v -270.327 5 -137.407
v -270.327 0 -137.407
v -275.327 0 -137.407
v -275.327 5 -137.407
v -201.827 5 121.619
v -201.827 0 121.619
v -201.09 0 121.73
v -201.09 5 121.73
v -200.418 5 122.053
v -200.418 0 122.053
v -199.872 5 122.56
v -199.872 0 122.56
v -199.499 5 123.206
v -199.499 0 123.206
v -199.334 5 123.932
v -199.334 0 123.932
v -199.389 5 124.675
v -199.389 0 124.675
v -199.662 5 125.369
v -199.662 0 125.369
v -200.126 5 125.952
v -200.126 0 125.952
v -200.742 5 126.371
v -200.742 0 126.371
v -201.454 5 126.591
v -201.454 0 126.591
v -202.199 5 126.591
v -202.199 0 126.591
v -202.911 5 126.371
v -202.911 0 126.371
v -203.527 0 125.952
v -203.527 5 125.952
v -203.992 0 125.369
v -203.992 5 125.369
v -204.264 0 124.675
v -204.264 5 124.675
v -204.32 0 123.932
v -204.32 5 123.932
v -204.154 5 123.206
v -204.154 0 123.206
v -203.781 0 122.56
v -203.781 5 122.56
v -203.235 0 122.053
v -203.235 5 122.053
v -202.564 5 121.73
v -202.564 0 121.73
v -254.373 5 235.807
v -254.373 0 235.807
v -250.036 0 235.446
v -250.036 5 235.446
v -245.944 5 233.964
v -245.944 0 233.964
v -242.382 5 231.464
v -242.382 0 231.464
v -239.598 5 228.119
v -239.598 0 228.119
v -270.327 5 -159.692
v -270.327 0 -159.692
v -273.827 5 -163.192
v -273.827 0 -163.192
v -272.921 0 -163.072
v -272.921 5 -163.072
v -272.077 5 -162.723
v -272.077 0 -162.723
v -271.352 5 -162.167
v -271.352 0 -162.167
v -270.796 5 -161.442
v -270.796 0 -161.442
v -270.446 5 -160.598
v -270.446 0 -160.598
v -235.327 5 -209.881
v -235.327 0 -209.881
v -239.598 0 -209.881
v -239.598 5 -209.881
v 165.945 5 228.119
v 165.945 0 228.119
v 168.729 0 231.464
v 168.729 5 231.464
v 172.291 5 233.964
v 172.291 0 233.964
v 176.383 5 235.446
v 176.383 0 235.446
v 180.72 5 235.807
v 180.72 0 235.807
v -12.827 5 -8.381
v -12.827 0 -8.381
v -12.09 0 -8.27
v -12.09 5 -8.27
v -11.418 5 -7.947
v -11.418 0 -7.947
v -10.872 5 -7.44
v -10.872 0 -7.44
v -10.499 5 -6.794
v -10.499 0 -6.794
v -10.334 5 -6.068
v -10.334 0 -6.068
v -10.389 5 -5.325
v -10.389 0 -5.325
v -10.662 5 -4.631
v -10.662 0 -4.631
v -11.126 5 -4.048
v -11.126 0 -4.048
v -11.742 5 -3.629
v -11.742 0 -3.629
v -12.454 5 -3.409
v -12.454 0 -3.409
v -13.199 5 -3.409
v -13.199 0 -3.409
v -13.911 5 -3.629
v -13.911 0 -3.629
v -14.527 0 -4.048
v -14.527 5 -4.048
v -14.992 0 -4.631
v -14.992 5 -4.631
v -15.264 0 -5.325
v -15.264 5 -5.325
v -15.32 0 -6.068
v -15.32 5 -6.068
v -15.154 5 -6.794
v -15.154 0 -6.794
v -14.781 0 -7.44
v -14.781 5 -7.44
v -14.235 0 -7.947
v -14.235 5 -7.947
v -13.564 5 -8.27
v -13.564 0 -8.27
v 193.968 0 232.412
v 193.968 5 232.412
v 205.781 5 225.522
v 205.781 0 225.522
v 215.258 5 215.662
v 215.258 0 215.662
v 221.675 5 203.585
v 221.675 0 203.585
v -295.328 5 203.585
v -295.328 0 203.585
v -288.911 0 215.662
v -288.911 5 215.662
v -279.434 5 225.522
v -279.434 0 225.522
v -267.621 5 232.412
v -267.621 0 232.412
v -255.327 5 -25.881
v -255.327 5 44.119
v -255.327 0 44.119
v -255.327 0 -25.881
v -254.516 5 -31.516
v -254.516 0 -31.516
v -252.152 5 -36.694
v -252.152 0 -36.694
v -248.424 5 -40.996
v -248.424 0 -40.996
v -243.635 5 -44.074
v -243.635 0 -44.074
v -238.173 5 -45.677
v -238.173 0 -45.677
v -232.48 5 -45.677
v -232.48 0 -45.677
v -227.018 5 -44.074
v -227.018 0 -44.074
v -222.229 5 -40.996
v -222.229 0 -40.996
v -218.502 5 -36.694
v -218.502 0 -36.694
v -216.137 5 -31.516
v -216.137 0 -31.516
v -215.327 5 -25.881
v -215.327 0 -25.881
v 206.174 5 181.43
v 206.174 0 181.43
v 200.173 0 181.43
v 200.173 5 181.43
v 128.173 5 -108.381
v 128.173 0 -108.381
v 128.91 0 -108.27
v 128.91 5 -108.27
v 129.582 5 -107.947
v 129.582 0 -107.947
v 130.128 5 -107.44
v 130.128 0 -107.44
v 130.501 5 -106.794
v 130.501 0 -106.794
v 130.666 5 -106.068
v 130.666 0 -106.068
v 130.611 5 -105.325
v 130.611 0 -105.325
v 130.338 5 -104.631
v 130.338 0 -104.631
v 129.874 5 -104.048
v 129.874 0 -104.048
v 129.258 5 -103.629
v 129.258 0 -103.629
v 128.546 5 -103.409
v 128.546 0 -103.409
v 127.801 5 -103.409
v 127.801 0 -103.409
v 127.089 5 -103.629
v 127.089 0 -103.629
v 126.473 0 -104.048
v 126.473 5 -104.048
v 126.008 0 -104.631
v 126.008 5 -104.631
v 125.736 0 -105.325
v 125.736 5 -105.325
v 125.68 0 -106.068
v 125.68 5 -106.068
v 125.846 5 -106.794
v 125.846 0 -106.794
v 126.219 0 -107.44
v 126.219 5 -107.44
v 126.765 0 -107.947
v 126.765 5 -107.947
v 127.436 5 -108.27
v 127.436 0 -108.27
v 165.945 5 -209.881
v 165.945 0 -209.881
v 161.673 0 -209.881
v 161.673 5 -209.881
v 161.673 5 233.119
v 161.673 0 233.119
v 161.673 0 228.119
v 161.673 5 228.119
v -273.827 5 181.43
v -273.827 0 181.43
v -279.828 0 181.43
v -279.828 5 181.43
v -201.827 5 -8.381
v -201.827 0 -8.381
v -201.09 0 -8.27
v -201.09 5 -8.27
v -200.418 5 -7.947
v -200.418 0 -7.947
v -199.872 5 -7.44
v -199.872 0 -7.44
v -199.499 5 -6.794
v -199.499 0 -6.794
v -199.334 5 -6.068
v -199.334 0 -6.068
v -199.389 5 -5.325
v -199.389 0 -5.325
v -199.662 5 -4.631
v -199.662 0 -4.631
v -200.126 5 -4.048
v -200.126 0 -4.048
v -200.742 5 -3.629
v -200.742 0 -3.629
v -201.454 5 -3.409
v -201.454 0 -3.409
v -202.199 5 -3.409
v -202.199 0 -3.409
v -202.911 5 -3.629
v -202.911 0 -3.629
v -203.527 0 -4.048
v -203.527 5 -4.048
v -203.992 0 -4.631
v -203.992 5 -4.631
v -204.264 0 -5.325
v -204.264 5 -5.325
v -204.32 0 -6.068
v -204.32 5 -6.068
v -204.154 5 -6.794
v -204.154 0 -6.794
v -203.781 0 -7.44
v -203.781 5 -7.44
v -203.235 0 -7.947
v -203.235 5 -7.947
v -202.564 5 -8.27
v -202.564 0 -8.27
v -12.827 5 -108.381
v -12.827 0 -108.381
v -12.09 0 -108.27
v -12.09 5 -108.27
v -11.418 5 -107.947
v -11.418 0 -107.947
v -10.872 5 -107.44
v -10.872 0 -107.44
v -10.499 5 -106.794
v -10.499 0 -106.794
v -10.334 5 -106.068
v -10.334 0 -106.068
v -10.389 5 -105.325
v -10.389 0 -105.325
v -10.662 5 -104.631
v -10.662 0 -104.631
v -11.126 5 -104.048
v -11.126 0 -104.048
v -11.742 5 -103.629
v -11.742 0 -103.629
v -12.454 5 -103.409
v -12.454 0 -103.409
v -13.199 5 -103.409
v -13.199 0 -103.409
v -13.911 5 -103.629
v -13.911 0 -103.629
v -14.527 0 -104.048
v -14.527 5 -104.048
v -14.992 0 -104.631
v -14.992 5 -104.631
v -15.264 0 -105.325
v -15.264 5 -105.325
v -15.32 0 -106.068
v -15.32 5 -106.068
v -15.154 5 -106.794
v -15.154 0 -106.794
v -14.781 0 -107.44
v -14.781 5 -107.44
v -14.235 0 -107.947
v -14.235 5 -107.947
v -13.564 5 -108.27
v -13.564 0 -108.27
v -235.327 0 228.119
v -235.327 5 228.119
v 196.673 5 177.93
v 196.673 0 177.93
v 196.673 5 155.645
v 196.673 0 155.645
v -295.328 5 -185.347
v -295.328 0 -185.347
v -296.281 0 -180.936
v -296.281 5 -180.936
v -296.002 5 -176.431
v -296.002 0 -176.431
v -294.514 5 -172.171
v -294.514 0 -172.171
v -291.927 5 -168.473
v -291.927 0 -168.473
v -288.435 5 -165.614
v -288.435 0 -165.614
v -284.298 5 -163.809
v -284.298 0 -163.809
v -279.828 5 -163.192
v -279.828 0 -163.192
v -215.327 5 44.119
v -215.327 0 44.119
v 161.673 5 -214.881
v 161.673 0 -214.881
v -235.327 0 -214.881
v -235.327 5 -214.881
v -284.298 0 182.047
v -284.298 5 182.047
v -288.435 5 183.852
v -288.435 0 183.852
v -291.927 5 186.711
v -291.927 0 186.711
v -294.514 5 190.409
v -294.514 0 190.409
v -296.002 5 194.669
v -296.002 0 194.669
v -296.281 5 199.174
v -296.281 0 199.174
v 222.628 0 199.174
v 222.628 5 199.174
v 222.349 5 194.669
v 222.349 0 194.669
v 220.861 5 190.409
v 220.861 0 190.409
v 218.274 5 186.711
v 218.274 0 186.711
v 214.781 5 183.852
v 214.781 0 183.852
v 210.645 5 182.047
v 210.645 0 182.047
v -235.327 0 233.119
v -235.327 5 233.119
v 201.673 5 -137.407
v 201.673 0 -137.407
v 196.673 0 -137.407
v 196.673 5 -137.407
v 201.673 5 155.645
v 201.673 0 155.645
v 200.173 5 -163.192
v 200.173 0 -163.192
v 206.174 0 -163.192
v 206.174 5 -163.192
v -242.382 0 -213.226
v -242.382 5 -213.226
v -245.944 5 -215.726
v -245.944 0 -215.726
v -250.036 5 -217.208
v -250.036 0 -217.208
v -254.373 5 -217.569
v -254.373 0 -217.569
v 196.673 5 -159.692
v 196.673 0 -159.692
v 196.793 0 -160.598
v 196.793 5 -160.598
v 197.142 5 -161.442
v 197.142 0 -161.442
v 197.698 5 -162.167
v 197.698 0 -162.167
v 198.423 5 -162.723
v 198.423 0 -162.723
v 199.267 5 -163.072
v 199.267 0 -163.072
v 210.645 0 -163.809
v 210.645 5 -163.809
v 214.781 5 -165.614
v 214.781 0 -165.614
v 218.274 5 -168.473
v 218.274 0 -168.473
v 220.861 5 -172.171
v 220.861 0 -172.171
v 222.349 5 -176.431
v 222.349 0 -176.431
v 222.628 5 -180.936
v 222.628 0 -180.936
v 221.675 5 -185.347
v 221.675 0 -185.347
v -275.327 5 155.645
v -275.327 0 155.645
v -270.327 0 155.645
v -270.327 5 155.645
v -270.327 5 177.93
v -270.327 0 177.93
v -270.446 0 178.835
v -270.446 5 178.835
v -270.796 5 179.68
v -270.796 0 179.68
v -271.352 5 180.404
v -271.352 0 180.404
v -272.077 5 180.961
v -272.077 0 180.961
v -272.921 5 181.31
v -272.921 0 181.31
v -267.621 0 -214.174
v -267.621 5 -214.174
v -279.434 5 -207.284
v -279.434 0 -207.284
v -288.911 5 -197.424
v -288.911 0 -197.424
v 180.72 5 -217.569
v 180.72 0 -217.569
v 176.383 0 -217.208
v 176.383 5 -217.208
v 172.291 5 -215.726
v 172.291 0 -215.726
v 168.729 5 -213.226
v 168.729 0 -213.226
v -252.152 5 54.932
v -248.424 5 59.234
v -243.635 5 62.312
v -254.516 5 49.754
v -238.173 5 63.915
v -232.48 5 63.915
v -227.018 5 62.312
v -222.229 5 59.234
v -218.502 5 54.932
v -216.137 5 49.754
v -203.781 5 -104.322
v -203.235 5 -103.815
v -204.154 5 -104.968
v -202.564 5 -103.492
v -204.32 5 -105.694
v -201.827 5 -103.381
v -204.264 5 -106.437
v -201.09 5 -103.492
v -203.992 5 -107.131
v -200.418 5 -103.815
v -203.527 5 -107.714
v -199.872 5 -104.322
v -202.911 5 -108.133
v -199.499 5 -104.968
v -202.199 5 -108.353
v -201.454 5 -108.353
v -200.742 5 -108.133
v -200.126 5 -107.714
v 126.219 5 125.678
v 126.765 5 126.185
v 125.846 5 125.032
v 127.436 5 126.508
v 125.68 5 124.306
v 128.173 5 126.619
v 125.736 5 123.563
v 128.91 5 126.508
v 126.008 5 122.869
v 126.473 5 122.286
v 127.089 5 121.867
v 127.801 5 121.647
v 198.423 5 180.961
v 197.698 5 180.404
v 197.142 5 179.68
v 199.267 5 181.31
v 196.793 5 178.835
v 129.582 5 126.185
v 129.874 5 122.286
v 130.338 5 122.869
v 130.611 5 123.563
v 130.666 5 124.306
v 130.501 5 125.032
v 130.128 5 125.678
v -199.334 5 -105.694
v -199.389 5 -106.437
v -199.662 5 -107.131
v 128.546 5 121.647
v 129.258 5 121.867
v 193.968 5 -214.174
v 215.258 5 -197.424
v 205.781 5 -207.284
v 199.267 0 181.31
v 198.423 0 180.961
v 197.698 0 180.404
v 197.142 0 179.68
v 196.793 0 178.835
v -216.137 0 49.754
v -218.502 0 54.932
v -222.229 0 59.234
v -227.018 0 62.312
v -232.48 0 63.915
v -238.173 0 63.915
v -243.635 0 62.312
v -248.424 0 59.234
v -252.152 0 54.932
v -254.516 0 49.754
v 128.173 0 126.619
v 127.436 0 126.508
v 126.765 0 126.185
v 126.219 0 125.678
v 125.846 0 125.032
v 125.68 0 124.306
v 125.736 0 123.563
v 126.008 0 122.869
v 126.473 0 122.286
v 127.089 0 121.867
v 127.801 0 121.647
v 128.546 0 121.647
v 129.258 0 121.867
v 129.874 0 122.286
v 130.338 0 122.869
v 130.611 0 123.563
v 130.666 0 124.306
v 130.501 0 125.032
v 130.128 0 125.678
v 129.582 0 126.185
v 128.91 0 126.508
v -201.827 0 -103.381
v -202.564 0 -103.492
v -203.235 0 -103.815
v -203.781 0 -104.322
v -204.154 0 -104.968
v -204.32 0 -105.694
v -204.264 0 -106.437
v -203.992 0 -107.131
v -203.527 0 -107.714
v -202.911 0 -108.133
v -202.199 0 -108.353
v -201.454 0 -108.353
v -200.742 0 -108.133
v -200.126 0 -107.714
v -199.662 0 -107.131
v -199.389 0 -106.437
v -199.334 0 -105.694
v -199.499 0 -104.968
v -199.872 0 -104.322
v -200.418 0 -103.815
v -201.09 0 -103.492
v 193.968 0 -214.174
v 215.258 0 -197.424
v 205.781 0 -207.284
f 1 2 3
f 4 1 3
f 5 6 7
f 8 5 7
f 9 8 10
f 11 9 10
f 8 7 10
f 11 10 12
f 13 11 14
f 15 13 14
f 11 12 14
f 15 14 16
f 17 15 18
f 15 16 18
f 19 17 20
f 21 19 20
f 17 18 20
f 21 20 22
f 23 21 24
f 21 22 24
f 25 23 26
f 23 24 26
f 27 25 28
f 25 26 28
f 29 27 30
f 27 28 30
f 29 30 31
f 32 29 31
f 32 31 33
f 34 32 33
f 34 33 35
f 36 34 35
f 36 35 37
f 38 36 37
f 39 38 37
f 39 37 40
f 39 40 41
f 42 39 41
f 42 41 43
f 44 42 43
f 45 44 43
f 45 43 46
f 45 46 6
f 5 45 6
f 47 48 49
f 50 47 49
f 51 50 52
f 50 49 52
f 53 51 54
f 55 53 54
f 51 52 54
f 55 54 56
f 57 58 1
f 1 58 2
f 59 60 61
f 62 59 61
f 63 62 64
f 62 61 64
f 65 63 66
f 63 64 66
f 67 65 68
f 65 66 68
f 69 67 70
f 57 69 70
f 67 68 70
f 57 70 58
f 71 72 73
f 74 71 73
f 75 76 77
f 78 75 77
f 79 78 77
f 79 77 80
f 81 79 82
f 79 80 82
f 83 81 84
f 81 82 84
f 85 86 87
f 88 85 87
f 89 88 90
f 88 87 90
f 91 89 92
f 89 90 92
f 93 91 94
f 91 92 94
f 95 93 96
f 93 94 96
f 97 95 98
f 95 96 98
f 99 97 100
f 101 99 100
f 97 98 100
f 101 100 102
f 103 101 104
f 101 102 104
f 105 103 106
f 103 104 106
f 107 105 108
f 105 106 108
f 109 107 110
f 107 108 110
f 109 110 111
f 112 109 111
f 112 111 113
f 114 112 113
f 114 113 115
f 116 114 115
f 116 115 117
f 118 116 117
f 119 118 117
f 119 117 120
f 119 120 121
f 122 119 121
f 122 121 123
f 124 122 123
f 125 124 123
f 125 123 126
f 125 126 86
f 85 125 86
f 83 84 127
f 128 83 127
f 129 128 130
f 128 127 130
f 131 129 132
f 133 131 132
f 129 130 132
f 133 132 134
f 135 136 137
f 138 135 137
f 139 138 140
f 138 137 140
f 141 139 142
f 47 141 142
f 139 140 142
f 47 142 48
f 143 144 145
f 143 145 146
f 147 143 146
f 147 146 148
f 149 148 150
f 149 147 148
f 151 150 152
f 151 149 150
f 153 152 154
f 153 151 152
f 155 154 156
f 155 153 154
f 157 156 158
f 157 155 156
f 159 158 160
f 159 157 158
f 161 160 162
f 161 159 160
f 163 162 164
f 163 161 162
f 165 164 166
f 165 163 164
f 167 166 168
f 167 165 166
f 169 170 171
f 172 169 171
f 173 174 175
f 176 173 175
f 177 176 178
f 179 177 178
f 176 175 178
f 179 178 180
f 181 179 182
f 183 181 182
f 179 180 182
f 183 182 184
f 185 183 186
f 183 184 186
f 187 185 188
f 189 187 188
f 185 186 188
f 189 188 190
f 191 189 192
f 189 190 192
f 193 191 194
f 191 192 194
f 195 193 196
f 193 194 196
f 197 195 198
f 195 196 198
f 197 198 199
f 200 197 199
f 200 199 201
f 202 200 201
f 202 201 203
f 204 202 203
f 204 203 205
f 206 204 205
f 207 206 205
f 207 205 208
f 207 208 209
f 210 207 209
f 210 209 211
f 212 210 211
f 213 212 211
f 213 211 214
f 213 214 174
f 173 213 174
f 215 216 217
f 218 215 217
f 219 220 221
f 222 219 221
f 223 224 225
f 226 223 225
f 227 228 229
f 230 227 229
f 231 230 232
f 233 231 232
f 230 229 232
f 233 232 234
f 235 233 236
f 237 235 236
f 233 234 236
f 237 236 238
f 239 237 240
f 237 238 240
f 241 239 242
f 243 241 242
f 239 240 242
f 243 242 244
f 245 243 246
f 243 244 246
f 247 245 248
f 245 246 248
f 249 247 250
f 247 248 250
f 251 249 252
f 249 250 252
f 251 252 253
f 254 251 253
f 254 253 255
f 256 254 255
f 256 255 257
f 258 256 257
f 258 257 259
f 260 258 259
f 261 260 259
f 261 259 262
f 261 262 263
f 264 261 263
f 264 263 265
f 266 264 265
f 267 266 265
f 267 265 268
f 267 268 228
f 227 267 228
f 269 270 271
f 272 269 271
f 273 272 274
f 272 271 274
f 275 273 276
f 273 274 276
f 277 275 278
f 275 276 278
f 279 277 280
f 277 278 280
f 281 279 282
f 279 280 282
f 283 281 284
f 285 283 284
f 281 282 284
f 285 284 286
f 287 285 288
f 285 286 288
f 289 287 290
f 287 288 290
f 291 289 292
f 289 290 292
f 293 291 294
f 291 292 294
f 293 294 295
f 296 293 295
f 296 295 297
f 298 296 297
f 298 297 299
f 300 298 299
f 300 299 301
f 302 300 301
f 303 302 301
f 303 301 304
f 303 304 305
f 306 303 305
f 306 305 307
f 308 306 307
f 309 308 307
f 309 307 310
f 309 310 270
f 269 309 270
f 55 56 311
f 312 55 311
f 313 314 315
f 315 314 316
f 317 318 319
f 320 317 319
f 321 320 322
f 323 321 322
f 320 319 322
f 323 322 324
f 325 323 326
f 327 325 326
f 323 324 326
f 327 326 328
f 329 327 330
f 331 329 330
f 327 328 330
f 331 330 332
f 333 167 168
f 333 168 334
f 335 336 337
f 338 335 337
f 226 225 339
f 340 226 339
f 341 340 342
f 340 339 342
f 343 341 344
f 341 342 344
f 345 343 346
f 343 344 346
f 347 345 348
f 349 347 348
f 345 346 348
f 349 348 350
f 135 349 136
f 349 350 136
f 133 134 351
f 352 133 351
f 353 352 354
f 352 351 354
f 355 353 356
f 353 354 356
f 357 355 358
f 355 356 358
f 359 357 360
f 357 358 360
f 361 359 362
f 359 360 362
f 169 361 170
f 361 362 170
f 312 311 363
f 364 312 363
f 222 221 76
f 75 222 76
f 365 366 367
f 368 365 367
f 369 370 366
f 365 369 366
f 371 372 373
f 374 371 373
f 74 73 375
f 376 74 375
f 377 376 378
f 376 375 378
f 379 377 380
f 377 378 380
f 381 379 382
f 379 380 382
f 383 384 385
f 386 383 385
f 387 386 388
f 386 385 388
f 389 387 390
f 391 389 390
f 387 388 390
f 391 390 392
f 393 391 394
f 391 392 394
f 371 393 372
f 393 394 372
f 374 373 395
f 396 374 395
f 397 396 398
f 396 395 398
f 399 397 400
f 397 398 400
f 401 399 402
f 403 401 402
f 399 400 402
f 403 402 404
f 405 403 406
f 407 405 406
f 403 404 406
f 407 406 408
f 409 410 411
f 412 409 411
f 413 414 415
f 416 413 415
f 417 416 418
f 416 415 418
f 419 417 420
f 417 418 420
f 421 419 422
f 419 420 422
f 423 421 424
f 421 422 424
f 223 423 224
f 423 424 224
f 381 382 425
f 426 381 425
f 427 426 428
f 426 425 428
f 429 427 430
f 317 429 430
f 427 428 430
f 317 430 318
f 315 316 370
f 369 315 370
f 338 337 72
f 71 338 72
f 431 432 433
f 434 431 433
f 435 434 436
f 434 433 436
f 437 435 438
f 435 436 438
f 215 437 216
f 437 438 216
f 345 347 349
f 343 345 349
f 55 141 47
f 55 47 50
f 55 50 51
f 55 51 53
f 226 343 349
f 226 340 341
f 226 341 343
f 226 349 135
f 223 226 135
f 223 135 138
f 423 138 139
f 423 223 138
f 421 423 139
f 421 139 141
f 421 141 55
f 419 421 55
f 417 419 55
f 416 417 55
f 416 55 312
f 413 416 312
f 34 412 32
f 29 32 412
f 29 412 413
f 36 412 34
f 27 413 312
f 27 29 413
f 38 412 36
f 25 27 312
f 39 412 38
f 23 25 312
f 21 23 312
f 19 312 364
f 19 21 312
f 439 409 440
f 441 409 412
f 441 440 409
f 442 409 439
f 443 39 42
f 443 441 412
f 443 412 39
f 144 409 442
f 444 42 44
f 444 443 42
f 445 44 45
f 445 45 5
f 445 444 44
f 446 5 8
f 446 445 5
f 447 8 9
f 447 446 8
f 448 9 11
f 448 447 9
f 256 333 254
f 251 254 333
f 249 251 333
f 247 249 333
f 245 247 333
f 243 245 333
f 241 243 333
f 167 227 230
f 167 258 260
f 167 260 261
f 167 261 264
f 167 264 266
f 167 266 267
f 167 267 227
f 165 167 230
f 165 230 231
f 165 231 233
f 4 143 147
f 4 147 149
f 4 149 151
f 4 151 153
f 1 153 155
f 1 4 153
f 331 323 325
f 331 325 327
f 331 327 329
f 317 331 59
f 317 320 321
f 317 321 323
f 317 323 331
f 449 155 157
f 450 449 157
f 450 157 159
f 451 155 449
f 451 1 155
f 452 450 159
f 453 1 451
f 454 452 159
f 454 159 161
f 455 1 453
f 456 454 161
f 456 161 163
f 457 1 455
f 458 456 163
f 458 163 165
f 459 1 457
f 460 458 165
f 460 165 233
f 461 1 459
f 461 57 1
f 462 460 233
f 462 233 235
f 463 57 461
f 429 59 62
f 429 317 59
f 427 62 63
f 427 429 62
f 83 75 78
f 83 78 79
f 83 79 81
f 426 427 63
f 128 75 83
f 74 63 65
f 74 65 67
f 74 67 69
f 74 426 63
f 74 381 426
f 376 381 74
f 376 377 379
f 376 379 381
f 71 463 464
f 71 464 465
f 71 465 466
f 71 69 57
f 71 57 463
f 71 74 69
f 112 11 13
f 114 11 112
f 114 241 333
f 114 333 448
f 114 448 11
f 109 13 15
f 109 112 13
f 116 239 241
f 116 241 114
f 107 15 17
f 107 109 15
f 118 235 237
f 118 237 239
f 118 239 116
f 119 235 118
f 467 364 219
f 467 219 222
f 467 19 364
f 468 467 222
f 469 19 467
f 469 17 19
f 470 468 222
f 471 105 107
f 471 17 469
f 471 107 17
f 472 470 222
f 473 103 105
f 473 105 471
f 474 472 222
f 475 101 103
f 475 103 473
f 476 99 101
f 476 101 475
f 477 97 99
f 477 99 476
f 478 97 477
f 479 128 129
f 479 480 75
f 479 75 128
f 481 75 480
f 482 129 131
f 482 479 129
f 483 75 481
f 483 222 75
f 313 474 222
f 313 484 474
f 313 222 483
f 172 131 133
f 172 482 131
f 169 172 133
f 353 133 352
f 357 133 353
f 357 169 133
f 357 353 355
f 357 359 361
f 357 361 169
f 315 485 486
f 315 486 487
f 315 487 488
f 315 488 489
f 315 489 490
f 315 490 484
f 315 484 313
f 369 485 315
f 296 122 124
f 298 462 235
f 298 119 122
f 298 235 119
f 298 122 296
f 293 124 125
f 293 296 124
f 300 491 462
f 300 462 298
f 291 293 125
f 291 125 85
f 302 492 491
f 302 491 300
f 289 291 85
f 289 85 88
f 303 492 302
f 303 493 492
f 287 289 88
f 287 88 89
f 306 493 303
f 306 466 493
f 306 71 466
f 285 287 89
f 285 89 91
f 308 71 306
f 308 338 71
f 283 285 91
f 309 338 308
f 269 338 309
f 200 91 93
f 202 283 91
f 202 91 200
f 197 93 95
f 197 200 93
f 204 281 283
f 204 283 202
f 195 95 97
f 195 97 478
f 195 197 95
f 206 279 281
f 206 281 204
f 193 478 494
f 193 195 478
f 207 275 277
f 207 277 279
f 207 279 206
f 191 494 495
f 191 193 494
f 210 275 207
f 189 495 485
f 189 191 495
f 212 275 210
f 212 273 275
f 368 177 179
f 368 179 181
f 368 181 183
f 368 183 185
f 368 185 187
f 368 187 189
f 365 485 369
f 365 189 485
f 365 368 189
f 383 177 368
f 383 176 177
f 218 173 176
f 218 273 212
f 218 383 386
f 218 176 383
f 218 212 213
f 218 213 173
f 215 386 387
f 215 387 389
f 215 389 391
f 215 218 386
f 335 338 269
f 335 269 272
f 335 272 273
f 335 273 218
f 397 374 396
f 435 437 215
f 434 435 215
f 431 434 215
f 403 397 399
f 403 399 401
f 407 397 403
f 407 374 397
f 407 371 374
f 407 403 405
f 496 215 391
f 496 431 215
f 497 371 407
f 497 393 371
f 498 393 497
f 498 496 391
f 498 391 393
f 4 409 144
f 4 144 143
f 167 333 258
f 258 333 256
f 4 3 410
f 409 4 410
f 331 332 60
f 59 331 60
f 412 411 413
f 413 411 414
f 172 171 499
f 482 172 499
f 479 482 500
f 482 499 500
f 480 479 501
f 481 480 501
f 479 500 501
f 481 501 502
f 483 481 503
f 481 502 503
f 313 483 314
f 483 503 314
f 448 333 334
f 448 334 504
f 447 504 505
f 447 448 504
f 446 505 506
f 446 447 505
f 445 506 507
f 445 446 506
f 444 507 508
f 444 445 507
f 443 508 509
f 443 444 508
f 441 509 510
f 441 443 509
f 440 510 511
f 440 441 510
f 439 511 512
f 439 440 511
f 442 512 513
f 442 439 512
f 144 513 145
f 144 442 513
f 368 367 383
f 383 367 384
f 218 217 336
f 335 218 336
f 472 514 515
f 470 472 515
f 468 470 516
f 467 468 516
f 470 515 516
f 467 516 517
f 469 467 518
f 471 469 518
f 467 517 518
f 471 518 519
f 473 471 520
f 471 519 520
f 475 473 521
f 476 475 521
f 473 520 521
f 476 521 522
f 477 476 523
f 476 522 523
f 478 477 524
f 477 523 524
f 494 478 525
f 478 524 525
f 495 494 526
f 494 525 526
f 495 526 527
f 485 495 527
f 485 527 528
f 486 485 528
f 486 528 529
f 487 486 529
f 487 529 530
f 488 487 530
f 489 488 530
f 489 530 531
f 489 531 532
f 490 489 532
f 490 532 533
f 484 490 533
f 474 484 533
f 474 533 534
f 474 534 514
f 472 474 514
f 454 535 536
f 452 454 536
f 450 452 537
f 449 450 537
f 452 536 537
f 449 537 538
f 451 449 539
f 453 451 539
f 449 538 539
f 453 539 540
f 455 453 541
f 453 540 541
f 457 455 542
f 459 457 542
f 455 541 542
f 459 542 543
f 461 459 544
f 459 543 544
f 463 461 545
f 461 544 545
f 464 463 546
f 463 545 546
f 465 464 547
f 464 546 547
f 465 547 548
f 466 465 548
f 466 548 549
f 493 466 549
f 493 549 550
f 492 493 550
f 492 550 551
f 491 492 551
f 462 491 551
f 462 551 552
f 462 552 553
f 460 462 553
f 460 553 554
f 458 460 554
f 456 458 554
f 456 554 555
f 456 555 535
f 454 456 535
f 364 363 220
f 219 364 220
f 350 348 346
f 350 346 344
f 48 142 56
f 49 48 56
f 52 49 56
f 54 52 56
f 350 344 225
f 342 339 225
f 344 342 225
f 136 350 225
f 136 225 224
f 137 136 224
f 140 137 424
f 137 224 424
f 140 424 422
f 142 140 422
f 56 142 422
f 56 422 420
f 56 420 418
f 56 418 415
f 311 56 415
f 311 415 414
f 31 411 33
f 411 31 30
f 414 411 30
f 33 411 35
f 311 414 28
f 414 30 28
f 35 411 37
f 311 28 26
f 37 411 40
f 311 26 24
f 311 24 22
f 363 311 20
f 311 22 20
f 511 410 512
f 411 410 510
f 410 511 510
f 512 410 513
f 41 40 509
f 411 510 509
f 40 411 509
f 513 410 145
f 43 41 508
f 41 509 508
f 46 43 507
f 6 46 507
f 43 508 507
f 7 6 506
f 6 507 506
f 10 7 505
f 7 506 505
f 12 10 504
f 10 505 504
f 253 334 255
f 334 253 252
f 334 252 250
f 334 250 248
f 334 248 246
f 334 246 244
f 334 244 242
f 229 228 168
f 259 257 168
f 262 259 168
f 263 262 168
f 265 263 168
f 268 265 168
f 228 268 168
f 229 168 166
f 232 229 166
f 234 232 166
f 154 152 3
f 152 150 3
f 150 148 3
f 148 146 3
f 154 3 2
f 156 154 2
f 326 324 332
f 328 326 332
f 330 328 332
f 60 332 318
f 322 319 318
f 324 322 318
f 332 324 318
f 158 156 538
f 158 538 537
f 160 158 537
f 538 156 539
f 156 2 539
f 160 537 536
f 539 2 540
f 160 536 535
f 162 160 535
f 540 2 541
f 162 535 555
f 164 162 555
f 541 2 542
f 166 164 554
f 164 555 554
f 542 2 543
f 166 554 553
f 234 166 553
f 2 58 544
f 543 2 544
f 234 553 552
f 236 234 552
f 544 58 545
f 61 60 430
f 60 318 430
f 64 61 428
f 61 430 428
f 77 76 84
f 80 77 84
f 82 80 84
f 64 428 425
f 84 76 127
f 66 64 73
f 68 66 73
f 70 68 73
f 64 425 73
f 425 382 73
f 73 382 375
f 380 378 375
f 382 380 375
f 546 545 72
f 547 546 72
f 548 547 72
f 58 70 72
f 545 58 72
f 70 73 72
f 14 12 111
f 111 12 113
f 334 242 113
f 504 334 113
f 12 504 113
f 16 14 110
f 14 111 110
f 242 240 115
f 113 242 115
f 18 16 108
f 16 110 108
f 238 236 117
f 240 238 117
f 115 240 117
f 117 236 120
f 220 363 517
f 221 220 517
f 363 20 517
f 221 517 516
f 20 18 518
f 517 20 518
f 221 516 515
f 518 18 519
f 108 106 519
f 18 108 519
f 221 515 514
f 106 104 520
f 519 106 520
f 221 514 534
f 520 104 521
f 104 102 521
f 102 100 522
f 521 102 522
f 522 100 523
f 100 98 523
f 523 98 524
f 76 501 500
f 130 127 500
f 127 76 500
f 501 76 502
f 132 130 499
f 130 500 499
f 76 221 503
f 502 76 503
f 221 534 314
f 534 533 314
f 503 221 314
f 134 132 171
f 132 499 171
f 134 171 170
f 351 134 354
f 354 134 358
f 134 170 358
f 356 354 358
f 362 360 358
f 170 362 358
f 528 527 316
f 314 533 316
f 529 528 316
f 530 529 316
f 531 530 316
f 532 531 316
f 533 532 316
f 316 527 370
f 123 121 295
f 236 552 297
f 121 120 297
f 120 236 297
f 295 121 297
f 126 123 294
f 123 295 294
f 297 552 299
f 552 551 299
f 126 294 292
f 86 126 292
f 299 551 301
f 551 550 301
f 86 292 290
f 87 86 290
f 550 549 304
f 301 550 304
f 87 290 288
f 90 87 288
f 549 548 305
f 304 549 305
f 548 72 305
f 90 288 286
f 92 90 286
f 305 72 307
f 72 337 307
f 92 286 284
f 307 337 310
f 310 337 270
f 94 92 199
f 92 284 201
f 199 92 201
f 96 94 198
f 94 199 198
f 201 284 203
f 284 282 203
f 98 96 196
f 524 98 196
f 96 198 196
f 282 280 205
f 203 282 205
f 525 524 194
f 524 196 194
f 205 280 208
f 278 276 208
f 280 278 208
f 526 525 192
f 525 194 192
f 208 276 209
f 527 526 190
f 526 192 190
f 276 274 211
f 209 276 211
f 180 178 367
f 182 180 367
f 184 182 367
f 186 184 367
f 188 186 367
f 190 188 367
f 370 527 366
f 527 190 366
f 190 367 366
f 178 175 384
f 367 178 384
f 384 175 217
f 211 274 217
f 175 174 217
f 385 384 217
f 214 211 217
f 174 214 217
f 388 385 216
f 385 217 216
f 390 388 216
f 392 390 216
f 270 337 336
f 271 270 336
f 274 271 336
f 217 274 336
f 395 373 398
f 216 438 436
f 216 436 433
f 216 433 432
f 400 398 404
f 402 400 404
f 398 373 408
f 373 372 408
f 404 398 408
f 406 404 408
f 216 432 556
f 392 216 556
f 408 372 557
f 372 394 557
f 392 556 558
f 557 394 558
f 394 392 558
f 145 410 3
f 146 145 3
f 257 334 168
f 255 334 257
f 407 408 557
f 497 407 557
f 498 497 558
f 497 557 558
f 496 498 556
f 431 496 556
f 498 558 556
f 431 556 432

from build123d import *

# Parameters (mm, degrees)
BOSS_EXTRUDE1_DEPTH = 5
SKETCH4_R           = 2.5
CUT_EXTRUDE1_DEPTH  = 20
CUT_EXTRUDE2_DEPTH  = 10
SKETCH8_R           = 2.5
CUT_EXTRUDE3_DEPTH  = 10


with BuildPart() as part:
    # Sketch1 → Boss-Extrude1 (new body)
    with BuildSketch(Plane(origin=(0, 0, 0), x_dir=(1, 0, 0), z_dir=(0, 1, 0))):
        with BuildLine():
            Line((-279.827757823, 163.191662052), (-273.826637764, 163.191662052))
            ThreePointArc((-273.826637764, 163.191662052), (-271.35176403, 162.166535786), (-270.326637764, 159.691662052))
            Line((-270.326637764, 159.691662052), (-270.326637764, 137.406790352))
            Line((-270.326637764, 137.406790352), (-275.326637764, 137.406790352))
            Line((-275.326637764, 137.406790352), (-275.326637764, -155.644744292))
            Line((-275.326637764, -155.644744292), (-270.326637764, -155.644744292))
            Line((-270.326637764, -155.644744292), (-270.326637764, -177.929615992))
            ThreePointArc((-270.326637764, -177.929615992), (-271.35176403, -180.404489727), (-273.826637764, -181.429615992))
            Line((-273.826637764, -181.429615992), (-279.827757823, -181.429615992))
            ThreePointArc((-279.827757823, -181.429615992), (-293.34742446, -188.470830973), (-295.328317853, -203.584935503))
            ThreePointArc((-295.328317853, -203.584935503), (-279.434102169, -225.521844766), (-254.372898367, -235.807278357))
            ThreePointArc((-254.372898367, -235.807278357), (-245.944078079, -233.964230965), (-239.597831877, -228.11897697))
            Line((-239.597831877, -228.11897697), (-235.326637764, -228.11897697))
            Line((-235.326637764, -228.11897697), (-235.326637764, -233.11897697))
            Line((-235.326637764, -233.11897697), (161.673362236, -233.11897697))
            Line((161.673362236, -233.11897697), (161.673362236, -228.11897697))
            Line((161.673362236, -228.11897697), (165.944556349, -228.11897697))
            ThreePointArc((165.944556349, -228.11897697), (172.290802551, -233.964230965), (180.719622838, -235.807278357))
            ThreePointArc((180.719622838, -235.807278357), (205.780826641, -225.521844766), (221.675042324, -203.584935503))
            ThreePointArc((221.675042324, -203.584935503), (219.694148932, -188.470830973), (206.174482295, -181.429615992))
            Line((206.174482295, -181.429615992), (200.173362236, -181.429615992))
            ThreePointArc((200.173362236, -181.429615992), (197.698488502, -180.404489727), (196.673362236, -177.929615992))
            Line((196.673362236, -177.929615992), (196.673362236, -155.644744292))
            Line((196.673362236, -155.644744292), (201.673362236, -155.644744292))
            Line((201.673362236, -155.644744292), (201.673362236, 137.406790352))
            Line((201.673362236, 137.406790352), (196.673362236, 137.406790352))
            Line((196.673362236, 137.406790352), (196.673362236, 159.691662052))
            ThreePointArc((196.673362236, 159.691662052), (197.698488502, 162.166535786), (200.173362236, 163.191662052))
            Line((200.173362236, 163.191662052), (206.174482295, 163.191662052))
            ThreePointArc((206.174482295, 163.191662052), (219.694148932, 170.232877033), (221.675042324, 185.346981563))
            ThreePointArc((221.675042324, 185.346981563), (205.780826641, 207.283890825), (180.719622838, 217.569324417))
            ThreePointArc((180.719622838, 217.569324417), (172.290802551, 215.726277025), (165.944556349, 209.88102303))
            Line((165.944556349, 209.88102303), (161.673362236, 209.88102303))
            Line((161.673362236, 209.88102303), (161.673362236, 214.88102303))
            Line((161.673362236, 214.88102303), (-235.326637764, 214.88102303))
            Line((-235.326637764, 214.88102303), (-235.326637764, 209.88102303))
            Line((-235.326637764, 209.88102303), (-239.597831877, 209.88102303))
            ThreePointArc((-239.597831877, 209.88102303), (-245.944078079, 215.726277025), (-254.372898367, 217.569324417))
            ThreePointArc((-254.372898367, 217.569324417), (-279.434102169, 207.283890825), (-295.328317853, 185.346981563))
            ThreePointArc((-295.328317853, 185.346981563), (-293.34742446, 170.232877033), (-279.827757823, 163.191662052))
        make_face()
    extrude(amount=BOSS_EXTRUDE1_DEPTH)

    # Sketch4 → Cut-Extrude1 (cut)
    with BuildSketch(Plane.XZ):
        with Locations(Location((-201.826637764, 124.11897697, 0), (0, 0, 270))):
            Circle(SKETCH4_R)
        with Locations(Location((-201.826637764, -105.88102303, 0), (0, 0, 90))):
            Circle(SKETCH4_R)
        with Locations(Location((128.173362236, -105.88102303, 0), (0, 0, 270))):
            Circle(SKETCH4_R)
        with Locations(Location((128.173362236, 124.11897697, 0), (0, 0, 90))):
            Circle(SKETCH4_R)
    extrude(amount=-CUT_EXTRUDE1_DEPTH, mode=Mode.SUBTRACT)

    # Sketch5 → Cut-Extrude2 (cut)
    with BuildSketch(Plane(origin=(0, 5, 0), x_dir=(1, 0, 0), z_dir=(0, 1, 0))):
        with BuildLine():
            Line((-255.326637764, -44.11897697), (-255.326637764, 25.88102303))
            ThreePointArc((-255.326637764, 25.88102303), (-235.326637764, 45.88102303), (-215.326637764, 25.88102303))
            Line((-215.326637764, 25.88102303), (-215.326637764, -44.11897697))
            ThreePointArc((-215.326637764, -44.11897697), (-235.326637764, -64.11897697), (-255.326637764, -44.11897697))
        make_face()
    extrude(amount=-CUT_EXTRUDE2_DEPTH, mode=Mode.SUBTRACT)

    # Sketch8 → Cut-Extrude3 (cut)
    with BuildSketch(Plane.XZ):
        with Locations(Location((-201.826637764, -105.88102303, 0), (0, 0, 90))):
            Circle(SKETCH8_R)
        with Locations(Location((-201.826637764, -5.88102303, 0), (0, 0, 270))):
            Circle(SKETCH8_R)
        with Locations(Location((-12.826637764, -5.88102303, 0), (0, 0, 270))):
            Circle(SKETCH8_R)
        with Locations(Location((-12.826637764, -105.88102303, 0), (0, 0, 270))):
            Circle(SKETCH8_R)
    extrude(amount=-CUT_EXTRUDE3_DEPTH, mode=Mode.SUBTRACT)


solid = part.part
